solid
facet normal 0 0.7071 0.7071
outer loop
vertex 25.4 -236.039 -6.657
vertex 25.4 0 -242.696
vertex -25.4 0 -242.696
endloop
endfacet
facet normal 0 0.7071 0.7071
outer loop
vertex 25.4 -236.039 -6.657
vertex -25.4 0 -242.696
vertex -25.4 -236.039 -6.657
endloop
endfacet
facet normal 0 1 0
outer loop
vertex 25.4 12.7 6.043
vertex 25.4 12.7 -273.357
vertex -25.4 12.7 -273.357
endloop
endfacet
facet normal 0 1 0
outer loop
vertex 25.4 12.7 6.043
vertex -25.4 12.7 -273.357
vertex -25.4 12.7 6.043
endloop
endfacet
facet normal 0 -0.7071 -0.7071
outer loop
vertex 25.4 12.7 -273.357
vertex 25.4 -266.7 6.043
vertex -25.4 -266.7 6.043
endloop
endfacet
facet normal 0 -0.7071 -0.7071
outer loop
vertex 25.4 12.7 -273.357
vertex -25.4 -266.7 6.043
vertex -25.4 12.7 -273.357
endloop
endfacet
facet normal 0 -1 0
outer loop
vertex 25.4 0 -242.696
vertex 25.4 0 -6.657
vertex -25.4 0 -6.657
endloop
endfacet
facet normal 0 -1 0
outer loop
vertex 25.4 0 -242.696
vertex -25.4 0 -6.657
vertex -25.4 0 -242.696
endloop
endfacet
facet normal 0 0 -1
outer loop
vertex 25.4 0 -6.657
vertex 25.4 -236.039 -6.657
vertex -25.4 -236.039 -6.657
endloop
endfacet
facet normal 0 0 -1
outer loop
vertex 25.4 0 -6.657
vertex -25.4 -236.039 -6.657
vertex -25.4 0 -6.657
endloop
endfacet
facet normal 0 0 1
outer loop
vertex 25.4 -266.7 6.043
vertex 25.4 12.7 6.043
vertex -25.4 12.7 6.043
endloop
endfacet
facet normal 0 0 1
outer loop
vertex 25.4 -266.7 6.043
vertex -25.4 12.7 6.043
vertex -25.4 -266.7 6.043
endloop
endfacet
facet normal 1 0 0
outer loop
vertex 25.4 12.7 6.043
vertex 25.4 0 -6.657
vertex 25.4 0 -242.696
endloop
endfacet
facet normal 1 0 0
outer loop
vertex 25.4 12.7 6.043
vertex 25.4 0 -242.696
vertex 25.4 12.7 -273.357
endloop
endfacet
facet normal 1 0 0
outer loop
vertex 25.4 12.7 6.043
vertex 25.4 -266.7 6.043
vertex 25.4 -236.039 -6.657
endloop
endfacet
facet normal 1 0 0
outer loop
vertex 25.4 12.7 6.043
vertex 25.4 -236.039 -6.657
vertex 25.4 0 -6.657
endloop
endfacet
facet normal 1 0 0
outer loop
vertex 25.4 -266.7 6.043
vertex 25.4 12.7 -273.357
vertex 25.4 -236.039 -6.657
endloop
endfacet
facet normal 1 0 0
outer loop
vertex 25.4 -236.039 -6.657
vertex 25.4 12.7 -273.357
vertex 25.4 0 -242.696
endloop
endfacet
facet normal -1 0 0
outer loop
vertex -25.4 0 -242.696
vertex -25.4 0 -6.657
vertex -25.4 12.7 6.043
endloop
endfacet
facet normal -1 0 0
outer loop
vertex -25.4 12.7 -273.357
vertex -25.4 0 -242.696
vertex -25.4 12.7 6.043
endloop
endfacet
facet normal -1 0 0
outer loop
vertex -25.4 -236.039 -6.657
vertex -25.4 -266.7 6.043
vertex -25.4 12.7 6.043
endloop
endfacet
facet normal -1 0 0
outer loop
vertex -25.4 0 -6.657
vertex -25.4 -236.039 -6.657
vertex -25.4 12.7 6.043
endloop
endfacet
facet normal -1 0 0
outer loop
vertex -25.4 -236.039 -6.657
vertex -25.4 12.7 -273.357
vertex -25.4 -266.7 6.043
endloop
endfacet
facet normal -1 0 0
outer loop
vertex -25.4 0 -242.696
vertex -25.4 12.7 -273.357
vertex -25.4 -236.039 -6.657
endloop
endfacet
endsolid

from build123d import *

# Parameters (mm, degrees)
F0_W          = 12.7
F0_H          = 12.7
F1_DEPTH      = 25.4
F1_DEPTH_BACK = 25.4
F2_DEPTH      = 25.4


with BuildPart() as f1:
    # F0 (on Right) → F1 (new body, two sides)
    with BuildSketch(Plane.YZ) as f1_sk:
        with Locations((6.35, -0.3065654278)):
            Rectangle(F0_W, F0_H)
        Polygon((0, -6.6565654278), (0, 6.0434345722), (-254, 6.0434345722), (-254, -6.6565654278), (-236.0394877579, -6.6565654278), align=None)
        Polygon((12.7, -6.6565654278), (0, -6.6565654278), (0, -242.6960531856), (0, -260.1933913213), (12.7, -260.6565654278), align=None)
        Polygon((-254, -6.6565654278), (-254, 6.0434345722), (-266.7, 6.0434345722), align=None)
        Polygon((0, -260.1933913213), (0, -242.6960531856), (-236.0394877579, -6.6565654278), (-254, -6.6565654278), (-0.4807056342, -260.1758597936), align=None)
        Polygon((12.7, -273.3565654278), (12.7, -260.6565654278), (0, -260.6565654278), align=None)
        Polygon((0, -260.6565654278), (12.7, -260.6565654278), (0, -260.1933913213), align=None)
        Polygon((0, -260.6565654278), (0, -260.1933913213), (-0.4807056342, -260.1758597936), align=None)
    extrude(amount=F1_DEPTH)
    extrude(f1_sk.sketch, amount=-F1_DEPTH_BACK)

    # F0 (on Right) → F2 (join)
    with BuildSketch(Plane.YZ):
        with Locations((6.35, -0.3065654278)):
            Rectangle(F0_W, F0_H)
        Polygon((0, -6.6565654278), (0, 6.0434345722), (-254, 6.0434345722), (-254, -6.6565654278), (-236.0394877579, -6.6565654278), align=None)
        Polygon((12.7, -6.6565654278), (0, -6.6565654278), (0, -242.6960531856), (0, -260.1933913213), (12.7, -260.6565654278), align=None)
        Polygon((-254, -6.6565654278), (-254, 6.0434345722), (-266.7, 6.0434345722), align=None)
        Polygon((0, -260.1933913213), (0, -242.6960531856), (-236.0394877579, -6.6565654278), (-254, -6.6565654278), (-0.4807056342, -260.1758597936), align=None)
        Polygon((12.7, -273.3565654278), (12.7, -260.6565654278), (0, -260.6565654278), align=None)
        Polygon((0, -260.6565654278), (12.7, -260.6565654278), (0, -260.1933913213), align=None)
        Polygon((0, -260.6565654278), (0, -260.1933913213), (-0.4807056342, -260.1758597936), align=None)
    extrude(amount=F2_DEPTH)


solid = f1.part
